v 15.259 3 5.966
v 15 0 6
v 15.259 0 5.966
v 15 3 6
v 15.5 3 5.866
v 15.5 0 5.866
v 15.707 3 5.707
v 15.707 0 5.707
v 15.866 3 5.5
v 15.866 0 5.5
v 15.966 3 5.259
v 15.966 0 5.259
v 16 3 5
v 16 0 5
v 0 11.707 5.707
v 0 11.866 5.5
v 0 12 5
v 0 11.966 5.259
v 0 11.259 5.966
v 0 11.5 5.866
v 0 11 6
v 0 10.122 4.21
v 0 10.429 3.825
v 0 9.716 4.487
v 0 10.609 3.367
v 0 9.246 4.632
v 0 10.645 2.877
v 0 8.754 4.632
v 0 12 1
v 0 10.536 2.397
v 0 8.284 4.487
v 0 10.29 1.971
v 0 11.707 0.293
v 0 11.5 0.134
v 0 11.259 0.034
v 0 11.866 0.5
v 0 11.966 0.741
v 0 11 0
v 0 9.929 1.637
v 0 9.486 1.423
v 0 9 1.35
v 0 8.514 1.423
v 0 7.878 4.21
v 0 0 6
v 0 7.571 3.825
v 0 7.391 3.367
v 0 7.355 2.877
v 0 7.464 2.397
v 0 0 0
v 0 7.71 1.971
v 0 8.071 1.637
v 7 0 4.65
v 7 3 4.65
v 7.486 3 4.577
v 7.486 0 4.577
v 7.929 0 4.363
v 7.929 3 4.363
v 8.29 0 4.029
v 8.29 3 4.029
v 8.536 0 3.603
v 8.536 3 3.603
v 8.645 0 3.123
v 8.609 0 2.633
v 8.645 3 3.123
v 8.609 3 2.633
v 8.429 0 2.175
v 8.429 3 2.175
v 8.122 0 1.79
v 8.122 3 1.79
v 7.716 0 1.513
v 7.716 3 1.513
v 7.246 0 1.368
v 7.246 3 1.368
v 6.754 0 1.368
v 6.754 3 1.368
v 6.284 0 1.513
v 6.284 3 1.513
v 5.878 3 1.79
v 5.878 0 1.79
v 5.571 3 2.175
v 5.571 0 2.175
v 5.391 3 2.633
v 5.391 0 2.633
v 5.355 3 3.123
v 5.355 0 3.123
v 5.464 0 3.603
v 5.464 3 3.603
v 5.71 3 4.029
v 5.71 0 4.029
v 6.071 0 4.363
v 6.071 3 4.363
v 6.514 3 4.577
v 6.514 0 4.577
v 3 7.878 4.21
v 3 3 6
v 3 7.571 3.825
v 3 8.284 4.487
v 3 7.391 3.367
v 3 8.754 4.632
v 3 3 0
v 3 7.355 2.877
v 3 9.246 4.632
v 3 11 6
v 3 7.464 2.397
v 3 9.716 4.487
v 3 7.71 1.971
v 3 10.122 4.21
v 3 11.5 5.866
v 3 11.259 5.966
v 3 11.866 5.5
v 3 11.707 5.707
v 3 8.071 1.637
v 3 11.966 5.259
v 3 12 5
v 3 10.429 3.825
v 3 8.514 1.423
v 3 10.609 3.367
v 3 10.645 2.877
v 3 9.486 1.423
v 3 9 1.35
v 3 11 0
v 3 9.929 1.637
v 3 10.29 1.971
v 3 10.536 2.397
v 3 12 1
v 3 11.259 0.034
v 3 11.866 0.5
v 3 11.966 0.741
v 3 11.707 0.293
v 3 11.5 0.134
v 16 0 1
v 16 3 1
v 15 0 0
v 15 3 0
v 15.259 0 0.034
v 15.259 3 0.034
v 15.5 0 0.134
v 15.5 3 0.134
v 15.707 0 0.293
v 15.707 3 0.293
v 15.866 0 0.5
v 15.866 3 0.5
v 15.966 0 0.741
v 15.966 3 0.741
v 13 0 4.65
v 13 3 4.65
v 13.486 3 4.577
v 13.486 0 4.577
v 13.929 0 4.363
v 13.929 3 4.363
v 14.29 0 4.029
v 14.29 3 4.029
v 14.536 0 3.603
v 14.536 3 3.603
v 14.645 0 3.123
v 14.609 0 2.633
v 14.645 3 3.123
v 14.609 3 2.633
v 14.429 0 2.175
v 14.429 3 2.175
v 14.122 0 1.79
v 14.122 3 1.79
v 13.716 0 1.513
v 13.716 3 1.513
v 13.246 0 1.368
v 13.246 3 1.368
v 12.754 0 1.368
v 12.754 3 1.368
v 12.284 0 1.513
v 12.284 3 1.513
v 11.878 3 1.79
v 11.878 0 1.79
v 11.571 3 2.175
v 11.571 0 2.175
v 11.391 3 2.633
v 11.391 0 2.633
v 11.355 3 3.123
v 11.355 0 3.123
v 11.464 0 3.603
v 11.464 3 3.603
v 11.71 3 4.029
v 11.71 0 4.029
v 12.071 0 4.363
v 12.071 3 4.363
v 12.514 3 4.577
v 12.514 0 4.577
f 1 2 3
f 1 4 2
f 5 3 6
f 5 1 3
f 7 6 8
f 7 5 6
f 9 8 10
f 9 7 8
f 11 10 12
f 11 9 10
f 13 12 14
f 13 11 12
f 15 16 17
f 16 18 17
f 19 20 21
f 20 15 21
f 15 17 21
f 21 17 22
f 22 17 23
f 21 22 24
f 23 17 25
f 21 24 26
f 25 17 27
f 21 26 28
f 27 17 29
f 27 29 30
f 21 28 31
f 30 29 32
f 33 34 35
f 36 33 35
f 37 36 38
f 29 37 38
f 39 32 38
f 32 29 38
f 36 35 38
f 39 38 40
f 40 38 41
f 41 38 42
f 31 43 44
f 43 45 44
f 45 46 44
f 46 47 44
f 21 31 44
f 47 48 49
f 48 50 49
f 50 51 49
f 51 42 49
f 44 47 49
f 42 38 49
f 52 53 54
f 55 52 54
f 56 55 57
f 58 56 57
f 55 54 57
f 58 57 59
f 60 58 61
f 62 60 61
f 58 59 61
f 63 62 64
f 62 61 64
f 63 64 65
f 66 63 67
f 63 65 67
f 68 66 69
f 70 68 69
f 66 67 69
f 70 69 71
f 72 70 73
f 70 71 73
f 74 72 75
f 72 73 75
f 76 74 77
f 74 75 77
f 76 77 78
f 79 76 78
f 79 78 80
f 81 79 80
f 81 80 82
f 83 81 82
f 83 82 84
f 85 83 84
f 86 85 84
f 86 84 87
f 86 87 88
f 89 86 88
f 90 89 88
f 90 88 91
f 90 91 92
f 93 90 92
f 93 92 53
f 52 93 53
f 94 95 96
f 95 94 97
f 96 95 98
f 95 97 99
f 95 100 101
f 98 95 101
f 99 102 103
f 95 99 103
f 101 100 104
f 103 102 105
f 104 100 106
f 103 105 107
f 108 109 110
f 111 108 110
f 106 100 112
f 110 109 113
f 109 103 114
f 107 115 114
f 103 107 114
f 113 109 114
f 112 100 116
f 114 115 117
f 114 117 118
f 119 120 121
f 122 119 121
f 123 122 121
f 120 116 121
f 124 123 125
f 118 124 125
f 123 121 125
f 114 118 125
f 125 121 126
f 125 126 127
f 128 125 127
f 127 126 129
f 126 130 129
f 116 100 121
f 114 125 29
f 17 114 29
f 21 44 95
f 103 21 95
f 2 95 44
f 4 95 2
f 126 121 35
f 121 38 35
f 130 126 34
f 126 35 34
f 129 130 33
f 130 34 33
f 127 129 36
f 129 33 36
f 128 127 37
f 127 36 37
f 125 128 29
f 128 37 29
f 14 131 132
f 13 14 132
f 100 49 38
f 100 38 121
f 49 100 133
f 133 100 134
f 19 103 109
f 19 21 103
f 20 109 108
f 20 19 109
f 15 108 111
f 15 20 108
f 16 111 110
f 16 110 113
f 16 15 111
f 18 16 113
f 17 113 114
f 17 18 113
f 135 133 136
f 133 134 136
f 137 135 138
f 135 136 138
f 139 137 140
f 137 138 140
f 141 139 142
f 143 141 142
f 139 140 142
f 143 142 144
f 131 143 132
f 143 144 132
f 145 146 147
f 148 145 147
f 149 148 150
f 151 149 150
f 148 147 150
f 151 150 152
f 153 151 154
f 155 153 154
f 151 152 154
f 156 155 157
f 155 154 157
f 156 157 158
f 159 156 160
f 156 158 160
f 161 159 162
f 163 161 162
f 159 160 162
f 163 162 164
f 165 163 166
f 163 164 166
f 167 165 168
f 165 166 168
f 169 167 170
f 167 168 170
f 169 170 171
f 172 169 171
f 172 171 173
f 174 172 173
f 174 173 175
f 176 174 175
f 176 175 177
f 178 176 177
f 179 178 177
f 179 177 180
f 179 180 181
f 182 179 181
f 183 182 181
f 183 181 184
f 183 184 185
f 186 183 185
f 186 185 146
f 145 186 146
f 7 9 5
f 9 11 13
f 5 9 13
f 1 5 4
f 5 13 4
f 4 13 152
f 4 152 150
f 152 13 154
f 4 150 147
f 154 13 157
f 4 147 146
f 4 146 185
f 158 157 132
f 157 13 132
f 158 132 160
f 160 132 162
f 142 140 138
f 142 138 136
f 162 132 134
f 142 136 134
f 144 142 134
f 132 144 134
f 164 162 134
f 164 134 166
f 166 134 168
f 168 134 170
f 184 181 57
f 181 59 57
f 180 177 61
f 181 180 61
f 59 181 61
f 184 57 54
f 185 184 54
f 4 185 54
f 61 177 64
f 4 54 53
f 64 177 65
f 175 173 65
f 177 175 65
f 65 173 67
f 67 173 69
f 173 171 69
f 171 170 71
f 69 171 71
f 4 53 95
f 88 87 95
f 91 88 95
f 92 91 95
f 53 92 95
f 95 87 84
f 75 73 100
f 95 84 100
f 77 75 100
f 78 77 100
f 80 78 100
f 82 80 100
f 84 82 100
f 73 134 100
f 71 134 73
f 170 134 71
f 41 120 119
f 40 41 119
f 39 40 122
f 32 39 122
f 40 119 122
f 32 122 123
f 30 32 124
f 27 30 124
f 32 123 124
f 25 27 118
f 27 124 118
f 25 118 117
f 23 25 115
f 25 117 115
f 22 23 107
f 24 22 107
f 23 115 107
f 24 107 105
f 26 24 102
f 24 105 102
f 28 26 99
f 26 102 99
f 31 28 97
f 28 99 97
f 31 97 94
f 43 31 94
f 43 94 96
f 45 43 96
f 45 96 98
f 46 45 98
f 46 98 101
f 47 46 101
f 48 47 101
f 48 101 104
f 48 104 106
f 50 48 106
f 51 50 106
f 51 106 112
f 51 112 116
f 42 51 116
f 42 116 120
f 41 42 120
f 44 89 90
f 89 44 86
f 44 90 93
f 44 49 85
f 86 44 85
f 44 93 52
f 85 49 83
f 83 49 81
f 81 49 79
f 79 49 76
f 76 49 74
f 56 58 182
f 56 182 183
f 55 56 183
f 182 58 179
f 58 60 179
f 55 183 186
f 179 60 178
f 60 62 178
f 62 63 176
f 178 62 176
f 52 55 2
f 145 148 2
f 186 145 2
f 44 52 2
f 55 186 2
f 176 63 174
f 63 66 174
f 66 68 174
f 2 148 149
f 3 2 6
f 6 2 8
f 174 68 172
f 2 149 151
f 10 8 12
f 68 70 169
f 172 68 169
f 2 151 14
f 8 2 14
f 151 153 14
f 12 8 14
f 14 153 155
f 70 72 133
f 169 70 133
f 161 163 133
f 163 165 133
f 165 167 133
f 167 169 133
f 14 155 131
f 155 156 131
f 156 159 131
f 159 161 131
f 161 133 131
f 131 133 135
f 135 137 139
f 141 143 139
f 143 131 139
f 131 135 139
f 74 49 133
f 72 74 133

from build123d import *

# Parameters (mm, degrees)
EXTRUDE_1_DEPTH     = 6
SKETCH_2_R          = 1.65
CUT_EXTRUDE_1_DEPTH = 6
SKETCH_3_R          = 1.65
CUT_EXTRUDE_2_DEPTH = 6
FILLET_1_R          = 1


with BuildPart() as part:
    # 草图1 → 凸台-拉伸1 (new body)
    with BuildSketch(Plane.XY):
        Polygon((0, 0), (16, 0), (16, 3), (3, 3), (3, 12), (0, 12), align=None)
    extrude(amount=EXTRUDE_1_DEPTH)

    # 草图2 → 切除-拉伸1 (cut)
    with BuildSketch(Plane(origin=(3, 0, 0), x_dir=(0, 0, -1), z_dir=(1, 0, 0))):
        with Locations((-3, 9)):
            Circle(SKETCH_2_R)
    extrude(amount=-CUT_EXTRUDE_1_DEPTH, mode=Mode.SUBTRACT)

    # 草图3 → 切除-拉伸2 (cut)
    with BuildSketch(Plane(origin=(0, 3, 0), x_dir=(1, 0, 0), z_dir=(0, 1, 0))):
        with Locations(Location((7, -3, 0), (0, 0, 270))):
            Circle(SKETCH_3_R)
        with Locations(Location((13, -3, 0), (0, 0, 270))):
            Circle(SKETCH_3_R)
    extrude(amount=-CUT_EXTRUDE_2_DEPTH, mode=Mode.SUBTRACT)

    # 圆角1
    fillet_1_edges = [part.edges().sort_by_distance(p)[0] for p in [
        (16, 1.5, 6),
        (1.5, 12, 6),
        (1.5, 12, 0),
        (16, 1.5, 0),
    ]]
    fillet(fillet_1_edges, radius=FILLET_1_R)


solid = part.part
